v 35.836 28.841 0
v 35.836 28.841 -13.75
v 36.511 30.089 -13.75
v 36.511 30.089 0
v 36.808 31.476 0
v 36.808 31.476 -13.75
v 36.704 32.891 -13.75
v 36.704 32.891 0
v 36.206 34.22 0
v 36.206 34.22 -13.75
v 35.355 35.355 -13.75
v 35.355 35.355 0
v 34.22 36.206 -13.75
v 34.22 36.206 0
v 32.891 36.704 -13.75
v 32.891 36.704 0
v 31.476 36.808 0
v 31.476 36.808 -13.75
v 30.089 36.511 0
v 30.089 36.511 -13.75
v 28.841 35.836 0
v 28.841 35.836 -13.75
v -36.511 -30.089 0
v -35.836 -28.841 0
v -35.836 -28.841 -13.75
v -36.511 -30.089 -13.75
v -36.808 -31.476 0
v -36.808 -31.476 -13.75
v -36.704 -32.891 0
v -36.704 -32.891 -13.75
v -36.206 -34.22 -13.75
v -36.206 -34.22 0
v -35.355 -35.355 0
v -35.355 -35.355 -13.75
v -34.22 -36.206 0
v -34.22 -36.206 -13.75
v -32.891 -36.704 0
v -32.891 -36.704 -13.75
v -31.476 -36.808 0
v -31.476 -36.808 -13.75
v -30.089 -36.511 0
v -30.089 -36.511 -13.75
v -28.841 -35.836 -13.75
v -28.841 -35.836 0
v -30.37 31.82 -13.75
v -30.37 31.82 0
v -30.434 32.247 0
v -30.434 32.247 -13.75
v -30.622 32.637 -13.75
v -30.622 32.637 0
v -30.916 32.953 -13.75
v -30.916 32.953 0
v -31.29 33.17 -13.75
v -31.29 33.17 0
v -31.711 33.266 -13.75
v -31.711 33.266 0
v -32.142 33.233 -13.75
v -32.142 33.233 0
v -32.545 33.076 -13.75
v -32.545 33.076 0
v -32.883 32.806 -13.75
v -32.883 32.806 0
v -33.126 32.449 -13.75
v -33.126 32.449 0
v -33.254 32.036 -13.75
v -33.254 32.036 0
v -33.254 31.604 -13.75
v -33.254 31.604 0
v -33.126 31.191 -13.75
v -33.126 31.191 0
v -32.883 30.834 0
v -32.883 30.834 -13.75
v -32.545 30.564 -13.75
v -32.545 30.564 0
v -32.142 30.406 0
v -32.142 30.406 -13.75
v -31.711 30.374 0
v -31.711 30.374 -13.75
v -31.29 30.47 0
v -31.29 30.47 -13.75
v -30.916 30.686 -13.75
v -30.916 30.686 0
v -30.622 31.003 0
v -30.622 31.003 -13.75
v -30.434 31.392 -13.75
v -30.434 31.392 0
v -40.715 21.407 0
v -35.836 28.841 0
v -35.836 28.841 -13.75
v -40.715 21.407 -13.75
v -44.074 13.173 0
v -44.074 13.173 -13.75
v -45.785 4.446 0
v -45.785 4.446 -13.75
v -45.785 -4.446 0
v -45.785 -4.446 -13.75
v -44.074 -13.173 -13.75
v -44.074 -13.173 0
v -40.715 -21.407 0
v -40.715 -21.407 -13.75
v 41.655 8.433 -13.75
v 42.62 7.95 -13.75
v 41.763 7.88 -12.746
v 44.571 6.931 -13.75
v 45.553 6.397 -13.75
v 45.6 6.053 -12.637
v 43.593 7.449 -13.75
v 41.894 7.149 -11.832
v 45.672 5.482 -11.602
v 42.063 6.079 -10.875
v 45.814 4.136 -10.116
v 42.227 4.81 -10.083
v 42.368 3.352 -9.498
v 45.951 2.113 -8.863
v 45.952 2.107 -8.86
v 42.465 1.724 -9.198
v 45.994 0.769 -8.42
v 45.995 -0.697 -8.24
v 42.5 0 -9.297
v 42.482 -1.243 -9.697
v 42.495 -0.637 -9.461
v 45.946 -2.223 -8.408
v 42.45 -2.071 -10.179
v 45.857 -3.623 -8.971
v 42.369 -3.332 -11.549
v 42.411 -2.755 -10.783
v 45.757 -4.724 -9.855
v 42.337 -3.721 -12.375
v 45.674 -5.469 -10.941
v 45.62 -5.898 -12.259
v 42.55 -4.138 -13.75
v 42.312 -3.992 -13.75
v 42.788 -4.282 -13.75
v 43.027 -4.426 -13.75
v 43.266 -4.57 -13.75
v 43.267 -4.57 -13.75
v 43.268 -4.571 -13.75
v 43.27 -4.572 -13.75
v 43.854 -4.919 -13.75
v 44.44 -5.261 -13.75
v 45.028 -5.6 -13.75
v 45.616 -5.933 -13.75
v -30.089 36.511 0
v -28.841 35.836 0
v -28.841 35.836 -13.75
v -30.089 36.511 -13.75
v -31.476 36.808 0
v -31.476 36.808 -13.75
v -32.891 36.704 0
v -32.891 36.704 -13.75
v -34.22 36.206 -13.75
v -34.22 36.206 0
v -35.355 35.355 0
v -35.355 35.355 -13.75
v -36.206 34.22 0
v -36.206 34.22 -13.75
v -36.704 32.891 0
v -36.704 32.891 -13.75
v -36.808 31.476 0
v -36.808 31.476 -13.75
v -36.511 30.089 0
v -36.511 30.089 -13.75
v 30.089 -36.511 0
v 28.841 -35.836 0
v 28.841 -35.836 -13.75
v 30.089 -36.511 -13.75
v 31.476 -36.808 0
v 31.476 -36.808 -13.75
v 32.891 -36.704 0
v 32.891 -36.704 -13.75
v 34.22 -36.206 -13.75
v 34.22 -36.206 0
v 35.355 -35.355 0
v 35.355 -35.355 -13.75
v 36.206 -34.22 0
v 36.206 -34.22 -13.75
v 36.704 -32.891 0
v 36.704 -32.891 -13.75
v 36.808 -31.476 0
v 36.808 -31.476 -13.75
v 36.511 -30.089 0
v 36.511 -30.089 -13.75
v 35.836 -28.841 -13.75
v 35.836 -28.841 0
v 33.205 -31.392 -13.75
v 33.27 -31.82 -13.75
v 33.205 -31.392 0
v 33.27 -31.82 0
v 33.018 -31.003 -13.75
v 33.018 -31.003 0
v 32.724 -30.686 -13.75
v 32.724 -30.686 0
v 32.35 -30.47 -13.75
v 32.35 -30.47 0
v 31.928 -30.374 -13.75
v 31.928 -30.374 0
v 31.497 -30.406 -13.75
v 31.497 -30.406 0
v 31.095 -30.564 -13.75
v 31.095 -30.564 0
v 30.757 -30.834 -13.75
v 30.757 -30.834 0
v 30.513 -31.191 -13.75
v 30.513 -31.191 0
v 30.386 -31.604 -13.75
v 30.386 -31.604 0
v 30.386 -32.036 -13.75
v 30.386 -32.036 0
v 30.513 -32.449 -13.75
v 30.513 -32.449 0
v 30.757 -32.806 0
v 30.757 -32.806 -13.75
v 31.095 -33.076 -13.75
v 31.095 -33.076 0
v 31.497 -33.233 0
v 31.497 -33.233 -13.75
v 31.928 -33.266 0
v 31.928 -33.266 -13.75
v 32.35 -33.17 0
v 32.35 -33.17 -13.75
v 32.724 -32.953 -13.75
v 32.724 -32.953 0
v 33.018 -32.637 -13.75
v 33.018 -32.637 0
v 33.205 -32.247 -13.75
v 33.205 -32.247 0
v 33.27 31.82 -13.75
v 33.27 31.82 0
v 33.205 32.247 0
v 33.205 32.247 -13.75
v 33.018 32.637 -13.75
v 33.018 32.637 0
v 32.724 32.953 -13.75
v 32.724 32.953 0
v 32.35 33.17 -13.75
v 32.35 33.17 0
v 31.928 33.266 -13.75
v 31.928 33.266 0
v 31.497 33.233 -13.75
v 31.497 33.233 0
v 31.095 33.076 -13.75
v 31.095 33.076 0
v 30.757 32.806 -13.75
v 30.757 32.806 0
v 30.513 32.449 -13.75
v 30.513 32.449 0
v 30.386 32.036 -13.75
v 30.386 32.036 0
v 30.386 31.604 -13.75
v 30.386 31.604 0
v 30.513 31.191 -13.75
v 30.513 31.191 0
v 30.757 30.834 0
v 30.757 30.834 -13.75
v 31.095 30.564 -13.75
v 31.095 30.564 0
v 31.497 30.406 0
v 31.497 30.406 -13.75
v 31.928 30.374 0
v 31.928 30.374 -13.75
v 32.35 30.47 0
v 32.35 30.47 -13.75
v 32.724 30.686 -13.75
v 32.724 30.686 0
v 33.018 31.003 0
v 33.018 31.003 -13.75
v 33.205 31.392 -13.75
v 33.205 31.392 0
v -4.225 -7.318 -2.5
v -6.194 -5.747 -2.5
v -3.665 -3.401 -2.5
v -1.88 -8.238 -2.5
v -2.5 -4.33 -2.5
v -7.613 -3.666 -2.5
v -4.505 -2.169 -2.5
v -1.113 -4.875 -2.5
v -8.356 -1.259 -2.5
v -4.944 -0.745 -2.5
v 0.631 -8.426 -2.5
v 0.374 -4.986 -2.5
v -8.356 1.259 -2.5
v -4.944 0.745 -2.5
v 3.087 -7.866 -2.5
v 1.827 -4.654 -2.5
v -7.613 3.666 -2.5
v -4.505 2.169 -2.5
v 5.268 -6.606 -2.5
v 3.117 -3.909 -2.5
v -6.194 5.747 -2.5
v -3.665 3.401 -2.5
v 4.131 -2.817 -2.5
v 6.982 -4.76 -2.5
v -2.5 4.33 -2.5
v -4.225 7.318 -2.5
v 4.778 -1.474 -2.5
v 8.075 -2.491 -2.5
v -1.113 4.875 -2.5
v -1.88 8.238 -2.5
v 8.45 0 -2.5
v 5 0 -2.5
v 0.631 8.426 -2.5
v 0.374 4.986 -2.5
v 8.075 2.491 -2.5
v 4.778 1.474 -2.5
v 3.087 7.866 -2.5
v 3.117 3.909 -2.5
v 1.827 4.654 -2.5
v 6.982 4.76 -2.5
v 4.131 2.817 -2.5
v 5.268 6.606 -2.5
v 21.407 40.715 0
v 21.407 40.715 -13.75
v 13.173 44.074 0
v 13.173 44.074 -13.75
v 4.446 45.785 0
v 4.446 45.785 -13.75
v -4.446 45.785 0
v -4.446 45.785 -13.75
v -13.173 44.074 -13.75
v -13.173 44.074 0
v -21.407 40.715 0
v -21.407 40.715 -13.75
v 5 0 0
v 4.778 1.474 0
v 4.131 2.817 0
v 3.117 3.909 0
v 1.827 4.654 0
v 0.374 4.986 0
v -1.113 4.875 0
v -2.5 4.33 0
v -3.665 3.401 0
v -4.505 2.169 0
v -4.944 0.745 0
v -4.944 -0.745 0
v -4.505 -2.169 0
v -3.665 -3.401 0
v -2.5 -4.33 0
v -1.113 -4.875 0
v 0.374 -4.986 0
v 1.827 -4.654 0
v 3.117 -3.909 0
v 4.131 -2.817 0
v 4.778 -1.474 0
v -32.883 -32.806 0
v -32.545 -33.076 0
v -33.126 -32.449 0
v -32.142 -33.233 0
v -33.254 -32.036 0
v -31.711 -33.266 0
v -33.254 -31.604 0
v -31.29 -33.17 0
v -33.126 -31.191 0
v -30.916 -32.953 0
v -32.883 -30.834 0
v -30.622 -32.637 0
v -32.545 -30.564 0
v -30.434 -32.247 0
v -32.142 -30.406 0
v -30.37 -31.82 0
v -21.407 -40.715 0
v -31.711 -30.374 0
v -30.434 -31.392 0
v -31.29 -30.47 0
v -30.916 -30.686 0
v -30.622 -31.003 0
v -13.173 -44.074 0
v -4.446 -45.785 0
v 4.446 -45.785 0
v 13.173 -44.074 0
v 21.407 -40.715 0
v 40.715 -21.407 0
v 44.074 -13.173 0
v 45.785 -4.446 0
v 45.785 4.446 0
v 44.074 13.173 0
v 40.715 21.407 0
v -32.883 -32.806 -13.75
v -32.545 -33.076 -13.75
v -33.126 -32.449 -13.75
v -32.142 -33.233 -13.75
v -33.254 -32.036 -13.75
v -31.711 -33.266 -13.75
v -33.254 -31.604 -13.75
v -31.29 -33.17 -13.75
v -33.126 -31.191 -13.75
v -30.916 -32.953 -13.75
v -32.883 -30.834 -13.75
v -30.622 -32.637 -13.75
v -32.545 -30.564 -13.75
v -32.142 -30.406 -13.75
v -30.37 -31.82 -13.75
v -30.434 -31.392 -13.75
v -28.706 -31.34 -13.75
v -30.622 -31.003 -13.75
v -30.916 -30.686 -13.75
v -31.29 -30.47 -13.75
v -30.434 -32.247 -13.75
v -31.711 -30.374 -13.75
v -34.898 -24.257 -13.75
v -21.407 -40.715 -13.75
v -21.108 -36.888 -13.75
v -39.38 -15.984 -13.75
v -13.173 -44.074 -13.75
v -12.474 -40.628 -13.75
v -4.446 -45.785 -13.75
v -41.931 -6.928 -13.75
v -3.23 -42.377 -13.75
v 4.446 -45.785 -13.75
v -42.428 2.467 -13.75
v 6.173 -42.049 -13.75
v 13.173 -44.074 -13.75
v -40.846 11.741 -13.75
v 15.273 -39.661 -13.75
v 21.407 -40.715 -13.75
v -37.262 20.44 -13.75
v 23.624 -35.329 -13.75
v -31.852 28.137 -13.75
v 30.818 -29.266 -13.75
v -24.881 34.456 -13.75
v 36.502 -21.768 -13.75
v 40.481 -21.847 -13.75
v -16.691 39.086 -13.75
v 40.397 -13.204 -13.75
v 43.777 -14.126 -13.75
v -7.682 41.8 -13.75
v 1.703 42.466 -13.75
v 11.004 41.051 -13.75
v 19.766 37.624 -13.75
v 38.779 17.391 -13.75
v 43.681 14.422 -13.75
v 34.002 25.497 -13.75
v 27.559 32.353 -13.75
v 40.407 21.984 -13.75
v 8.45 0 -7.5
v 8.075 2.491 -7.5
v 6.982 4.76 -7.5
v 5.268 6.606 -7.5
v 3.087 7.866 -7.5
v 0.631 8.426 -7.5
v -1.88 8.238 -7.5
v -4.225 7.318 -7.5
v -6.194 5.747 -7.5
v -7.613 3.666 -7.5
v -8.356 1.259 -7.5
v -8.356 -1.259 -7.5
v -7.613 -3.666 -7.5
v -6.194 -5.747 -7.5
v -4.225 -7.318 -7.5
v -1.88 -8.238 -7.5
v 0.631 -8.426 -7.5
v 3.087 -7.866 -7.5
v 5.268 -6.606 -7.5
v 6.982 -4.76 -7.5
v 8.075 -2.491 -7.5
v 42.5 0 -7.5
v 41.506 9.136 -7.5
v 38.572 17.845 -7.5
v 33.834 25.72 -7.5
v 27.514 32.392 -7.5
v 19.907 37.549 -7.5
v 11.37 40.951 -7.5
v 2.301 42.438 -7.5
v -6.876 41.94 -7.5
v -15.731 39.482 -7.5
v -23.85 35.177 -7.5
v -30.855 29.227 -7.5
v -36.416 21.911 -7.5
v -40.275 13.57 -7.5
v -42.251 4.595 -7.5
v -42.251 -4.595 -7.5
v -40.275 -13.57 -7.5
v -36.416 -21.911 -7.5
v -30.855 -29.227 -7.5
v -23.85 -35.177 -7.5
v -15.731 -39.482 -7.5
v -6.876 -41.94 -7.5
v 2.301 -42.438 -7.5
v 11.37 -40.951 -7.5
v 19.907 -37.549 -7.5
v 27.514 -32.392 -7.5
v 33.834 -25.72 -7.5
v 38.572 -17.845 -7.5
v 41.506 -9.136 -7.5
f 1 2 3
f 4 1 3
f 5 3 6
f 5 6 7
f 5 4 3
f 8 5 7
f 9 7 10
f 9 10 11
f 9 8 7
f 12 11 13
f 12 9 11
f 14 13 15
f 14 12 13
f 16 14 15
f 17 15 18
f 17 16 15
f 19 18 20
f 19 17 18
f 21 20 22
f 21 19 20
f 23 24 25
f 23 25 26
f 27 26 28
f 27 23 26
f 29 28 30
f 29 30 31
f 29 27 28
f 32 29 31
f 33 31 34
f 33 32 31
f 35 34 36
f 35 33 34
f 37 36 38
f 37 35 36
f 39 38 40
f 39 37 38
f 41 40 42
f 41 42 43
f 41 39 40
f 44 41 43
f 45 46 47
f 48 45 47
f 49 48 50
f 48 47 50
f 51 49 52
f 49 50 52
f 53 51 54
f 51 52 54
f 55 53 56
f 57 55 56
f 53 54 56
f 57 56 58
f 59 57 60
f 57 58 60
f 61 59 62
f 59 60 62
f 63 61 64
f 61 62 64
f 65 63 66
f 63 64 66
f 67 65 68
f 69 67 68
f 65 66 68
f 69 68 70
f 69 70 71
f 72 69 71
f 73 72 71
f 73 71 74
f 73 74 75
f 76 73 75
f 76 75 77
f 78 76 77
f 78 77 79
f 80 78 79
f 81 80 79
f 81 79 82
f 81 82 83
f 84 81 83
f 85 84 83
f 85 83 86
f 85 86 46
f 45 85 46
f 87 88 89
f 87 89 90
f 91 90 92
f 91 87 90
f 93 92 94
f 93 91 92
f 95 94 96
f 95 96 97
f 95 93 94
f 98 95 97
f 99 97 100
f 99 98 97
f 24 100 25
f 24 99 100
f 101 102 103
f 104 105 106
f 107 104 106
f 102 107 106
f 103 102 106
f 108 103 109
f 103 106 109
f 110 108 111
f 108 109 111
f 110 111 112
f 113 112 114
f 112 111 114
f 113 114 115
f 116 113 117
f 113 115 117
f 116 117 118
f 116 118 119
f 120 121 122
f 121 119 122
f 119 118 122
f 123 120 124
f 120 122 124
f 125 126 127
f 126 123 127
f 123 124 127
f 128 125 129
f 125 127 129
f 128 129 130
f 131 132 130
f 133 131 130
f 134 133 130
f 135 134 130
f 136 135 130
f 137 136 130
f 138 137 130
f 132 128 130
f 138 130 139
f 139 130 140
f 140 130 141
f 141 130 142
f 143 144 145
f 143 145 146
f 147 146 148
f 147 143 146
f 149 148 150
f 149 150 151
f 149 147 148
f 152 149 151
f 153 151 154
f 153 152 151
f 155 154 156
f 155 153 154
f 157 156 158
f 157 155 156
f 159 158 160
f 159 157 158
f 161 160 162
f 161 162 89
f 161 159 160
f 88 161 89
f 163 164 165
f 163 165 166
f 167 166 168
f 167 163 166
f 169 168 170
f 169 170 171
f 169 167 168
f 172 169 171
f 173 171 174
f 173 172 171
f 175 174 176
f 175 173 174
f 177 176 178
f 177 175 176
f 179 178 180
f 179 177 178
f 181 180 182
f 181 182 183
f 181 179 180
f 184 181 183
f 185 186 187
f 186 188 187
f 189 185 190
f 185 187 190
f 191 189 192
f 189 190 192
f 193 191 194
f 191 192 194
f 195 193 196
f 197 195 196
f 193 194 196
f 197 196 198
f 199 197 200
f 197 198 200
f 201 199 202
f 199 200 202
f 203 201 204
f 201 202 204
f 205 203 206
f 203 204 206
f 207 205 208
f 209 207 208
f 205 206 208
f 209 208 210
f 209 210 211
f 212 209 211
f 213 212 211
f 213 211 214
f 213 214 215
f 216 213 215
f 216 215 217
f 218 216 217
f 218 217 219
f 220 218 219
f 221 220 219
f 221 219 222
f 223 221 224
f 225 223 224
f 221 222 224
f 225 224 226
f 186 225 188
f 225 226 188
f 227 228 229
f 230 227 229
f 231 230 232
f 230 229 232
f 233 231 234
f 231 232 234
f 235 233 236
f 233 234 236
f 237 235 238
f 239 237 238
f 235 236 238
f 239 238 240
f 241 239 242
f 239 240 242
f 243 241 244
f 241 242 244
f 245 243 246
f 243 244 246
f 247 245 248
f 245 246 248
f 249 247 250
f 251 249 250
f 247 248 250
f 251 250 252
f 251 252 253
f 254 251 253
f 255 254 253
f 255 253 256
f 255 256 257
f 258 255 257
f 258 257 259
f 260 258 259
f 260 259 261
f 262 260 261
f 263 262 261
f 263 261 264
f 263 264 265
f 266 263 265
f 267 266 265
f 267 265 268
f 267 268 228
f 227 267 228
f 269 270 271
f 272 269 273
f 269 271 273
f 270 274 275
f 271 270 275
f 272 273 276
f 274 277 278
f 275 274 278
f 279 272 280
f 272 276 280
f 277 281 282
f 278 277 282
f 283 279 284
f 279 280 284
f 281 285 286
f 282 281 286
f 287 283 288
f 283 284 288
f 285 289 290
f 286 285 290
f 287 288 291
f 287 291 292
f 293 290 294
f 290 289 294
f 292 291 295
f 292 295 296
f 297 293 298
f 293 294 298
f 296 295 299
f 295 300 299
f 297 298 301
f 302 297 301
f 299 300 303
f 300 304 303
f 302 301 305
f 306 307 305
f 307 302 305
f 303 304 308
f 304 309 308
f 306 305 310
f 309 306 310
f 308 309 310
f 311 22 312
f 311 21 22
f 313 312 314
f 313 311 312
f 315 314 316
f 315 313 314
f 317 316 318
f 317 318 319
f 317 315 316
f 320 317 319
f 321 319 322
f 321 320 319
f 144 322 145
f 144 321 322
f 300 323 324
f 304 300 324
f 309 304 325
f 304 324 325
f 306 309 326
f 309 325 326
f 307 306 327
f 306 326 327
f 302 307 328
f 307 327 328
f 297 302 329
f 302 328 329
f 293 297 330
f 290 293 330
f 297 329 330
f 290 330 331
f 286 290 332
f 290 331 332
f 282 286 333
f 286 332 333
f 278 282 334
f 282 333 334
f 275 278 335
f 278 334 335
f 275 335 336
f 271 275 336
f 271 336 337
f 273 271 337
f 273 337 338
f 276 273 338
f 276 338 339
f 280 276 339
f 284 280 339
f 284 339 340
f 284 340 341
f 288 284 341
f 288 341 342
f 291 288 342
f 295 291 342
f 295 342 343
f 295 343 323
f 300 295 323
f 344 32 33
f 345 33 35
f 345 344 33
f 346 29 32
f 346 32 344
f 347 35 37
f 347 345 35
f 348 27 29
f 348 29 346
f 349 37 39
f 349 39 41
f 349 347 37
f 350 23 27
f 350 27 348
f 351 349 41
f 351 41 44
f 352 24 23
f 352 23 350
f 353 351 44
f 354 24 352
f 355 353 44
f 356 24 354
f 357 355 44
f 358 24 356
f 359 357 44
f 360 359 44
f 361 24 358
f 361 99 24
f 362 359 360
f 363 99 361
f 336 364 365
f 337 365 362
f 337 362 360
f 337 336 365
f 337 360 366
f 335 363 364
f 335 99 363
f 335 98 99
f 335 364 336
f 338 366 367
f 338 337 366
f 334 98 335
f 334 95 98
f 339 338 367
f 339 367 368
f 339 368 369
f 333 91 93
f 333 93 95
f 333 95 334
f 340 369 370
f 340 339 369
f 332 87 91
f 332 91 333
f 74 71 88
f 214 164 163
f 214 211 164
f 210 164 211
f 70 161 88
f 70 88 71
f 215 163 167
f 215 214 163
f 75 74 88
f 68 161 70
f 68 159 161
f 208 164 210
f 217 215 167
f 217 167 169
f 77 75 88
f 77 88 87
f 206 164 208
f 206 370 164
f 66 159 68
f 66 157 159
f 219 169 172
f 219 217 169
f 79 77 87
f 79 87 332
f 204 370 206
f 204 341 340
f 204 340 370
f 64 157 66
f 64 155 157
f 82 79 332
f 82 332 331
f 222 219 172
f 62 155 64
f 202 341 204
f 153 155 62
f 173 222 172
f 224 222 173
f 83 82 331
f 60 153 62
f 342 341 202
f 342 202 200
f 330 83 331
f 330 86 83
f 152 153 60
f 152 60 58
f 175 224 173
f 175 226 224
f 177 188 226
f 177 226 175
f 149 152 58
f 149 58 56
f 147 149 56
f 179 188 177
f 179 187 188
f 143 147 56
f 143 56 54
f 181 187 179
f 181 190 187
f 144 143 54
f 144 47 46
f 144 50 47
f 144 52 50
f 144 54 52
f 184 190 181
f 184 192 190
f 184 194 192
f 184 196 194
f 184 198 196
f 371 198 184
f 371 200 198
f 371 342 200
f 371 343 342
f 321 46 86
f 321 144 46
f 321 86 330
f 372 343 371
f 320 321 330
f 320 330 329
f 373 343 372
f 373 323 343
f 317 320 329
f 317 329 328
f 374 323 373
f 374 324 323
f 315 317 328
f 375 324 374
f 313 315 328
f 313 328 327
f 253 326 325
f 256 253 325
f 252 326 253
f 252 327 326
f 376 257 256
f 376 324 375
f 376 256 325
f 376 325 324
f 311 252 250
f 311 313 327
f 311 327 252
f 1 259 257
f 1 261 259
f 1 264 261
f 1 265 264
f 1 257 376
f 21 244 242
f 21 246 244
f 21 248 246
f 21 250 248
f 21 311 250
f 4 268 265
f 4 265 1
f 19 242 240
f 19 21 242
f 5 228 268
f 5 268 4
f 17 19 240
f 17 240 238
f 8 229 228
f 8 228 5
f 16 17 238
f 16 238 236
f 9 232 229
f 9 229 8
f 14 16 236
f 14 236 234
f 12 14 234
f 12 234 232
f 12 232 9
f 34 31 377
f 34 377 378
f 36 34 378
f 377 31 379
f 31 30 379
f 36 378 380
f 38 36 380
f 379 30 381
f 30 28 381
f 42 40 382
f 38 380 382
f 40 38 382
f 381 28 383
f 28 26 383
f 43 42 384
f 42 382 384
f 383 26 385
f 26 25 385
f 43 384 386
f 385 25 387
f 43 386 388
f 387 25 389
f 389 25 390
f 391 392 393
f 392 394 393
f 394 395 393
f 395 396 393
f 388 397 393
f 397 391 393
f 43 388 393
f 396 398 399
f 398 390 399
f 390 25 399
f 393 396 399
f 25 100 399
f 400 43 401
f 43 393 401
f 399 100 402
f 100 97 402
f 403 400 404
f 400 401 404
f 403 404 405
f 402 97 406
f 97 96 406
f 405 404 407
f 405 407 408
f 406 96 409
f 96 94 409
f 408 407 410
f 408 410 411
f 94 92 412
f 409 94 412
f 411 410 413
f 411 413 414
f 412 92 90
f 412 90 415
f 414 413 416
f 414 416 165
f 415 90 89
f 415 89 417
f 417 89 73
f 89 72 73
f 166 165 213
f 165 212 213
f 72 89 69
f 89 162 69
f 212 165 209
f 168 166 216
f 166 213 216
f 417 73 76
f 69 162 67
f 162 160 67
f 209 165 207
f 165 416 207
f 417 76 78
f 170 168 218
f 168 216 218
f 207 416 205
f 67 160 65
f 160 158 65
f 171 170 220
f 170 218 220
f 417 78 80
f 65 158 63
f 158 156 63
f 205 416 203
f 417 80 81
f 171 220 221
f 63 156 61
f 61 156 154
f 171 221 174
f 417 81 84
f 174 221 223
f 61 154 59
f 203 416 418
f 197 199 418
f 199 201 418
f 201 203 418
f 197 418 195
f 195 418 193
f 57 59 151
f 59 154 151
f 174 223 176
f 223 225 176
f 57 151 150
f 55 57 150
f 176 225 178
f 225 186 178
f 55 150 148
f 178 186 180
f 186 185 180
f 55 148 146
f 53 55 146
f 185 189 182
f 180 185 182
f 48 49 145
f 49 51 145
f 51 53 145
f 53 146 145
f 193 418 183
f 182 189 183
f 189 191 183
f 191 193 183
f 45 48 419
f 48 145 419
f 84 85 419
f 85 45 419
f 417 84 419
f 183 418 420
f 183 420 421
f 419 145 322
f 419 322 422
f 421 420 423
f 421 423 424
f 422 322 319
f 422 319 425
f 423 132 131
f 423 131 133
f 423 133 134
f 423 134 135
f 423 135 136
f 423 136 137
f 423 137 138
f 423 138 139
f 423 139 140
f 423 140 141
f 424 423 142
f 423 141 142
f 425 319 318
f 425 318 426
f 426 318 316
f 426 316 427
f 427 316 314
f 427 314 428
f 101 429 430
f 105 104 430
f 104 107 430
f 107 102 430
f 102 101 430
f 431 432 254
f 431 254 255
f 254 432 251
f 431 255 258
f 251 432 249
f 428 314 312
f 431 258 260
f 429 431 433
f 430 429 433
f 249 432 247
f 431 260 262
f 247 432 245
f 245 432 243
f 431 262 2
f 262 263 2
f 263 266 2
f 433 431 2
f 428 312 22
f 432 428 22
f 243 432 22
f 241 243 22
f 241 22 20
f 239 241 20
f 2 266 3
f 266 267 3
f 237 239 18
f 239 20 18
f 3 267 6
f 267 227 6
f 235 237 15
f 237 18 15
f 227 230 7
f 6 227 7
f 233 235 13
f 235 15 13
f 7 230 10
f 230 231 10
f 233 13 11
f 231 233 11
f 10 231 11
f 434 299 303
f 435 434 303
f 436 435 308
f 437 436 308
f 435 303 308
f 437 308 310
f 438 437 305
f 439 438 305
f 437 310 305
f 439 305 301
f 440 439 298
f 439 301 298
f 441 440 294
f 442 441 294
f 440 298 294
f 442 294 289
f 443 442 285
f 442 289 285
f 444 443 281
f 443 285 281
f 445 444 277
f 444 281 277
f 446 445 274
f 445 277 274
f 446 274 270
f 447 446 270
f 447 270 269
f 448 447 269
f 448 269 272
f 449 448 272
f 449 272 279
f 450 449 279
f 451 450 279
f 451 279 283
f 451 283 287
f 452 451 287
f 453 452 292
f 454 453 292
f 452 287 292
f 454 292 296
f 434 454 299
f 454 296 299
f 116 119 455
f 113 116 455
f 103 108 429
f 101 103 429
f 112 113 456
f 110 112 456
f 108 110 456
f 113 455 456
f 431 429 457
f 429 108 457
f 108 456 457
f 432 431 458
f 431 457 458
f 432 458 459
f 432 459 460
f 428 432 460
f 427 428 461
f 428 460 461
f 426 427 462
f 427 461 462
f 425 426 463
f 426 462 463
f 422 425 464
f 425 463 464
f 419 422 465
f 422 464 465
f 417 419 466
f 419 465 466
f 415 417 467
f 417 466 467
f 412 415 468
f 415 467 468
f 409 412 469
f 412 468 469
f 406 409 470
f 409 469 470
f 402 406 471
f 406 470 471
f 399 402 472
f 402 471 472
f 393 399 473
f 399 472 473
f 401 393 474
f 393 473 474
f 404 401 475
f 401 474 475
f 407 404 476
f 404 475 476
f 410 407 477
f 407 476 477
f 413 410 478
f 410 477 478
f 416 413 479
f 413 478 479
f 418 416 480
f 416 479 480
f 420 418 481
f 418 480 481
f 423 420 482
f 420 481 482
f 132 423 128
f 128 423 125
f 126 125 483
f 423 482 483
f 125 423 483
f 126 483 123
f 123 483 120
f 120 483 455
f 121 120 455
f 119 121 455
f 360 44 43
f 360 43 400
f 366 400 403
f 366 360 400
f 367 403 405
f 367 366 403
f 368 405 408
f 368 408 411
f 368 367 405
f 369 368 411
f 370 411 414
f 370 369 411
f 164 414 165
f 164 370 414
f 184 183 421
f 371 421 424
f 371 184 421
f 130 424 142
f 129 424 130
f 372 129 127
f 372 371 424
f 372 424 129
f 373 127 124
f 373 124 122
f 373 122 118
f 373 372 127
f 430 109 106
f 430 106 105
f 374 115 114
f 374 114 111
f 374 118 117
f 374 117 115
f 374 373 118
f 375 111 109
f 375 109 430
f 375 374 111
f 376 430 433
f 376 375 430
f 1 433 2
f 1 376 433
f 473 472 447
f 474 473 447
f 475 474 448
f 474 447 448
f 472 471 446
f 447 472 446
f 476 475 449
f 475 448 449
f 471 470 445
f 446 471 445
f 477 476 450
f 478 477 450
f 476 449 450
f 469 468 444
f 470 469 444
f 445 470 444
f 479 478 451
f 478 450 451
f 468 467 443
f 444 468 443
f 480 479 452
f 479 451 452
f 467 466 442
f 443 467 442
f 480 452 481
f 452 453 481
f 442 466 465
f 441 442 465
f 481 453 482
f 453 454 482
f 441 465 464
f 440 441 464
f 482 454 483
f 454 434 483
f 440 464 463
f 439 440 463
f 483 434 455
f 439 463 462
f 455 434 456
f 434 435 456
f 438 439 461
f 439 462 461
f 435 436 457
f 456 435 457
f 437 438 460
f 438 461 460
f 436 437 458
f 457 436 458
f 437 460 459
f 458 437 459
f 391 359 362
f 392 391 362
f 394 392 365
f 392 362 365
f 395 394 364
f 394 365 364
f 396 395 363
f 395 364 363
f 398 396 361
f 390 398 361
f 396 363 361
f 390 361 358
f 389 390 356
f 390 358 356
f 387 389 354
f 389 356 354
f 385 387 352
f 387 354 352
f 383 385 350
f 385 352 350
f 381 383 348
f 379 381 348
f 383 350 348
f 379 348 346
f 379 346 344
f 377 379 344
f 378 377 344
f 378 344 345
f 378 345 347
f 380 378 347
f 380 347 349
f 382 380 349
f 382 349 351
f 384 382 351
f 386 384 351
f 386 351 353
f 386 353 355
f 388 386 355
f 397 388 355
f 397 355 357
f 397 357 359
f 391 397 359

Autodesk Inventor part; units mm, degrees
ref_plane "YZ Plane" through (0, 0, 0) normal (1, 0, 0) x (0, 1, 0)
ref_plane "XZ Plane" through (0, 0, 0) normal (0, 1, 0) x (-1, 0, 0)
sketch "Sketch1" plane through (0, 0, 0) normal (0, 0, 1) x (1, 0, 0)
  circle A0 centre (0, 0) radius 5
  circle A1 centre (0, 0) radius 8.45
  arc A2 (-35.8357, 28.841) -> (-35.8357, -28.841) centre (0, 0) ccw
  arc A3 (-28.841, -35.8357) -> (28.841, -35.8357) centre (0, 0) ccw
  circle A4 centre (0, 0) radius 42.5
  circle A5 centre (0, 0) radius 45 construction
  arc A6 (28.0933, -35.1535) -> (35.1535, -28.0933) centre (31.8198, -31.8198) ccw
  circle A7 centre (31.8198, -31.8198) radius 1.45
  arc A8 (35.8357, -28.841) -> (35.8357, 28.841) centre (0, 0) ccw
  circle A9 centre (-31.8198, -31.8198) radius 1.45
  arc A10 (-35.1535, -28.0933) -> (-28.0933, -35.1535) centre (-31.8198, -31.8198) ccw
  circle A11 centre (-31.8198, 31.8198) radius 1.45
  arc A12 (-28.0933, 35.1535) -> (-35.1535, 28.0933) centre (-31.8198, 31.8198) ccw
  line L0 (-31.8198, 31.8198) -> (31.8198, 31.8198) construction
  arc A13 (28.841, 35.8357) -> (-28.841, 35.8357) centre (0, 0) ccw
  circle A14 centre (31.8198, 31.8198) radius 1.45
  arc A15 (35.1535, 28.0933) -> (28.0933, 35.1535) centre (31.8198, 31.8198) ccw
  point P0 (0, -46)
  point P1 (0, 46)
  dimension "d2" = 10
  dimension "d3" = 16.9
  dimension "d4" = 85
  dimension "d5" = 90
  dimension "d6" = 2.9
  dimension "d7" = 5
  dimension "d8" = 360
  dimension "d9" = 92
extrude "Extrusion1" add sketch "Sketch1" against normal blind 2.5 contours A1
extrude "Extrusion2" add sketch "Sketch1" against normal blind 7.5 contours A4
extrude "Extrusion3" add sketch "Sketch1" against normal blind 13.75 contours A12 A13 A15 A8 A6 A3 A10 A2
sketch "Sketch2" plane through (0, 0, -13.75) normal (0, 0, -1) x (-1, 0, 0)
  arc A0 (-35.8357, 28.841) -> (-35.8357, -28.841) centre (0, 0) ccw projected
  line L0 (-46, 0) -> (-46, -31.8198) construction
  point P0 (-31.8198, -31.8198)
ref_plane "Work Plane1" through (46, 0, -13.75) normal (-0.9659, 0, -0.2588) x (0, -1, 0)
sketch "Sketch3" plane through (46, 0, -13.75) normal (-0.9659, 0, -0.2588) x (0, -1, 0)
  line L0 (0, 0) -> (0, -10) construction
  point P0 (0, 11.9057)
  dimension "d21" = 10
ref_plane "Work Plane3" through (46, 0, -13.75) normal (-0.8365, 0.5, -0.2241) x (0.2588, 0, -0.9659)
sketch "Sketch5" plane through (46, 0, -13.75) normal (-0.8365, 0.5, -0.2241) x (0.2588, 0, -0.9659)
  circle A0 centre (0, 0) radius 5.325
  point P0 (-25.1872, 20.4369)
  dimension "d23" = 10.65
extrude "Extrusion5" cut sketch "Sketch5" along normal mid plane 20
properties part number "Case Part 2 - V2"
